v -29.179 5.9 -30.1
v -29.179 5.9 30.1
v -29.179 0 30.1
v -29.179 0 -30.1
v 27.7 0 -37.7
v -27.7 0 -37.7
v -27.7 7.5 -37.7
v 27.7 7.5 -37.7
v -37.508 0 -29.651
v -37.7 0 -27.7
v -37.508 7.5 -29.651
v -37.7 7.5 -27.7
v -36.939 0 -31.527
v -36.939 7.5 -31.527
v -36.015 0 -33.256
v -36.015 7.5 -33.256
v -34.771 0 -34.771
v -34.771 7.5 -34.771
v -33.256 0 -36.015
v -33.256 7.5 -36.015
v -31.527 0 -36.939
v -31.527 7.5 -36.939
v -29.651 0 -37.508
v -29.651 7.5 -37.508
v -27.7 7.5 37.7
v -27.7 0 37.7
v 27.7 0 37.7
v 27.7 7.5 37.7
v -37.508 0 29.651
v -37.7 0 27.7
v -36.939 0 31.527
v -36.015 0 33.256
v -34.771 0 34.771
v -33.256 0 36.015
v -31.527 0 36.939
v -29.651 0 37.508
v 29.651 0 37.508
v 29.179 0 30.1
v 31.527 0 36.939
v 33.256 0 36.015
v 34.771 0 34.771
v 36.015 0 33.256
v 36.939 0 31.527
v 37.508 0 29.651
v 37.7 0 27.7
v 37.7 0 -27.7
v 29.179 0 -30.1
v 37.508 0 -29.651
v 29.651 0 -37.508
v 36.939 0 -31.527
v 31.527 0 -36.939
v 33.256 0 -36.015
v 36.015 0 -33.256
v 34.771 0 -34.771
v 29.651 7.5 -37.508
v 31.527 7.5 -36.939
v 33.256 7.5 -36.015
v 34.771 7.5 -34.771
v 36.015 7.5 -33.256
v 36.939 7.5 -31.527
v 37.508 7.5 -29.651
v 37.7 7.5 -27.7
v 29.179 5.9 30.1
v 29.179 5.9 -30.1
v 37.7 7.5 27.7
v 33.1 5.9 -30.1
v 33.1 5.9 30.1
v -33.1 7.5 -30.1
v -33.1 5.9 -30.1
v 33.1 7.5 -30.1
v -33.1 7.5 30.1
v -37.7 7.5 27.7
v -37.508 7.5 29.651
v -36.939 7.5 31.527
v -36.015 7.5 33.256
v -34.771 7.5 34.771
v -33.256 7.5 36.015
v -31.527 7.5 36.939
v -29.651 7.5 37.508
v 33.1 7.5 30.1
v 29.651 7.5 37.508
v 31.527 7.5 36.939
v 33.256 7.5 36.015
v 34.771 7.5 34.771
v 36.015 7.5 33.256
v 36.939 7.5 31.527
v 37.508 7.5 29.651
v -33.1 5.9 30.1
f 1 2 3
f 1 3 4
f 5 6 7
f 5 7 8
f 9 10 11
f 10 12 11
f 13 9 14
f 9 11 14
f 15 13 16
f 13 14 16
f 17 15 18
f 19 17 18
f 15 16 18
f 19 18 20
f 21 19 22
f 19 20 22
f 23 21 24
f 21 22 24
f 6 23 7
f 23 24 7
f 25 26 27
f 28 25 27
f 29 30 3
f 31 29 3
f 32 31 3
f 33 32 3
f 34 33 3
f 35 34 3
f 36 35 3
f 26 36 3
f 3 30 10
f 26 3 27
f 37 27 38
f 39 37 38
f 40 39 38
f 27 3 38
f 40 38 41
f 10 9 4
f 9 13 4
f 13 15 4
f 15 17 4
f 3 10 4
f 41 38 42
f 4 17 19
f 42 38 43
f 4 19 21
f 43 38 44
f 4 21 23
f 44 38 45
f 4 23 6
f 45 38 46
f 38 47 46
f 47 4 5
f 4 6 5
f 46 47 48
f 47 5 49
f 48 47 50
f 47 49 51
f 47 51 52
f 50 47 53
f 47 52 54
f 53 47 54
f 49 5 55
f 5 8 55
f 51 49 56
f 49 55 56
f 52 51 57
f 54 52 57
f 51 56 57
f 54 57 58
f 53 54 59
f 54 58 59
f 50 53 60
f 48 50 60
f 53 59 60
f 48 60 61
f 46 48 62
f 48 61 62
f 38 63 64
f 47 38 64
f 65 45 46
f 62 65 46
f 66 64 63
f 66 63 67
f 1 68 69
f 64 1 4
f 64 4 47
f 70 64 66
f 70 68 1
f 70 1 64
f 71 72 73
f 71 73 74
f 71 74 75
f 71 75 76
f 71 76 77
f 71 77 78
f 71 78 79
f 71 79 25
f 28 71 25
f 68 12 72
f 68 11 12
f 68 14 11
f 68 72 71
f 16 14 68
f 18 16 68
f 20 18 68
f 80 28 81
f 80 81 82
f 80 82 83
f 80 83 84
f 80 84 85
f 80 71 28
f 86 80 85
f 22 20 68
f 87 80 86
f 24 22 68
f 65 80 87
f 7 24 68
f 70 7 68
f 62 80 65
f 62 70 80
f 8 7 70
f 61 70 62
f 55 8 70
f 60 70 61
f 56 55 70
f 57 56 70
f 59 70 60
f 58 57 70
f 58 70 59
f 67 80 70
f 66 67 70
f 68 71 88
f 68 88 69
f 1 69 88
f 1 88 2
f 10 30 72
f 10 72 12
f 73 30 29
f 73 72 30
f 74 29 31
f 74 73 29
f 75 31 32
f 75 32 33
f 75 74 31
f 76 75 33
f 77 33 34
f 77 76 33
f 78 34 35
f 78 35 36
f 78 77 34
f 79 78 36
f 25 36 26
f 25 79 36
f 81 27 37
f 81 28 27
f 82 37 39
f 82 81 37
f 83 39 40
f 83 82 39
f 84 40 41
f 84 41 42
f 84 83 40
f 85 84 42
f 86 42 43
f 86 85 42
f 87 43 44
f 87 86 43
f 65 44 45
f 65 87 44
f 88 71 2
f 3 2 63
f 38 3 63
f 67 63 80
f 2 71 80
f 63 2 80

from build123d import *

# Parameters (mm, degrees)
SKETCH1_W             = 75.4
SKETCH1_H             = 75.4
BASE_DEPTH            = 7.5
SKETCH2_W             = 66.2
SKETCH2_H             = 60.2
SLOT_DEPTH            = 1.6
SKETCH3_W             = 58.357887306
SKETCH3_H             = 60.2
SLOT_COMPONENTS_DEPTH = 5.9
FILLET2_R             = 10


with BuildPart() as part:
    # Sketch1 → Base (new body)
    with BuildSketch(Plane(origin=(0, 0, 0), x_dir=(1, 0, 0), z_dir=(0, 1, 0))):
        Rectangle(SKETCH1_W, SKETCH1_H)
    extrude(amount=BASE_DEPTH)

    # Sketch2 → Slot (cut)
    with BuildSketch(Plane(origin=(0, 7.5, 0), x_dir=(1, 0, 0), z_dir=(0, 1, 0))):
        Rectangle(SKETCH2_W, SKETCH2_H)
    extrude(amount=-SLOT_DEPTH, mode=Mode.SUBTRACT)

    # Sketch3 → Slot-Components (cut)
    with BuildSketch(Plane(origin=(0, 5.9, 0), x_dir=(1, 0, 0), z_dir=(0, 1, 0))):
        Rectangle(SKETCH3_W, SKETCH3_H)
    extrude(amount=-SLOT_COMPONENTS_DEPTH, mode=Mode.SUBTRACT)

    # Fillet2
    fillet2_edges = [part.edges().sort_by_distance(p)[0] for p in [
        (37.7, 3.75, 37.7),
        (-37.7, 3.75, 37.7),
        (-37.7, 3.75, -37.7),
        (37.7, 3.75, -37.7),
    ]]
    fillet(fillet2_edges, radius=FILLET2_R)


solid = part.part
